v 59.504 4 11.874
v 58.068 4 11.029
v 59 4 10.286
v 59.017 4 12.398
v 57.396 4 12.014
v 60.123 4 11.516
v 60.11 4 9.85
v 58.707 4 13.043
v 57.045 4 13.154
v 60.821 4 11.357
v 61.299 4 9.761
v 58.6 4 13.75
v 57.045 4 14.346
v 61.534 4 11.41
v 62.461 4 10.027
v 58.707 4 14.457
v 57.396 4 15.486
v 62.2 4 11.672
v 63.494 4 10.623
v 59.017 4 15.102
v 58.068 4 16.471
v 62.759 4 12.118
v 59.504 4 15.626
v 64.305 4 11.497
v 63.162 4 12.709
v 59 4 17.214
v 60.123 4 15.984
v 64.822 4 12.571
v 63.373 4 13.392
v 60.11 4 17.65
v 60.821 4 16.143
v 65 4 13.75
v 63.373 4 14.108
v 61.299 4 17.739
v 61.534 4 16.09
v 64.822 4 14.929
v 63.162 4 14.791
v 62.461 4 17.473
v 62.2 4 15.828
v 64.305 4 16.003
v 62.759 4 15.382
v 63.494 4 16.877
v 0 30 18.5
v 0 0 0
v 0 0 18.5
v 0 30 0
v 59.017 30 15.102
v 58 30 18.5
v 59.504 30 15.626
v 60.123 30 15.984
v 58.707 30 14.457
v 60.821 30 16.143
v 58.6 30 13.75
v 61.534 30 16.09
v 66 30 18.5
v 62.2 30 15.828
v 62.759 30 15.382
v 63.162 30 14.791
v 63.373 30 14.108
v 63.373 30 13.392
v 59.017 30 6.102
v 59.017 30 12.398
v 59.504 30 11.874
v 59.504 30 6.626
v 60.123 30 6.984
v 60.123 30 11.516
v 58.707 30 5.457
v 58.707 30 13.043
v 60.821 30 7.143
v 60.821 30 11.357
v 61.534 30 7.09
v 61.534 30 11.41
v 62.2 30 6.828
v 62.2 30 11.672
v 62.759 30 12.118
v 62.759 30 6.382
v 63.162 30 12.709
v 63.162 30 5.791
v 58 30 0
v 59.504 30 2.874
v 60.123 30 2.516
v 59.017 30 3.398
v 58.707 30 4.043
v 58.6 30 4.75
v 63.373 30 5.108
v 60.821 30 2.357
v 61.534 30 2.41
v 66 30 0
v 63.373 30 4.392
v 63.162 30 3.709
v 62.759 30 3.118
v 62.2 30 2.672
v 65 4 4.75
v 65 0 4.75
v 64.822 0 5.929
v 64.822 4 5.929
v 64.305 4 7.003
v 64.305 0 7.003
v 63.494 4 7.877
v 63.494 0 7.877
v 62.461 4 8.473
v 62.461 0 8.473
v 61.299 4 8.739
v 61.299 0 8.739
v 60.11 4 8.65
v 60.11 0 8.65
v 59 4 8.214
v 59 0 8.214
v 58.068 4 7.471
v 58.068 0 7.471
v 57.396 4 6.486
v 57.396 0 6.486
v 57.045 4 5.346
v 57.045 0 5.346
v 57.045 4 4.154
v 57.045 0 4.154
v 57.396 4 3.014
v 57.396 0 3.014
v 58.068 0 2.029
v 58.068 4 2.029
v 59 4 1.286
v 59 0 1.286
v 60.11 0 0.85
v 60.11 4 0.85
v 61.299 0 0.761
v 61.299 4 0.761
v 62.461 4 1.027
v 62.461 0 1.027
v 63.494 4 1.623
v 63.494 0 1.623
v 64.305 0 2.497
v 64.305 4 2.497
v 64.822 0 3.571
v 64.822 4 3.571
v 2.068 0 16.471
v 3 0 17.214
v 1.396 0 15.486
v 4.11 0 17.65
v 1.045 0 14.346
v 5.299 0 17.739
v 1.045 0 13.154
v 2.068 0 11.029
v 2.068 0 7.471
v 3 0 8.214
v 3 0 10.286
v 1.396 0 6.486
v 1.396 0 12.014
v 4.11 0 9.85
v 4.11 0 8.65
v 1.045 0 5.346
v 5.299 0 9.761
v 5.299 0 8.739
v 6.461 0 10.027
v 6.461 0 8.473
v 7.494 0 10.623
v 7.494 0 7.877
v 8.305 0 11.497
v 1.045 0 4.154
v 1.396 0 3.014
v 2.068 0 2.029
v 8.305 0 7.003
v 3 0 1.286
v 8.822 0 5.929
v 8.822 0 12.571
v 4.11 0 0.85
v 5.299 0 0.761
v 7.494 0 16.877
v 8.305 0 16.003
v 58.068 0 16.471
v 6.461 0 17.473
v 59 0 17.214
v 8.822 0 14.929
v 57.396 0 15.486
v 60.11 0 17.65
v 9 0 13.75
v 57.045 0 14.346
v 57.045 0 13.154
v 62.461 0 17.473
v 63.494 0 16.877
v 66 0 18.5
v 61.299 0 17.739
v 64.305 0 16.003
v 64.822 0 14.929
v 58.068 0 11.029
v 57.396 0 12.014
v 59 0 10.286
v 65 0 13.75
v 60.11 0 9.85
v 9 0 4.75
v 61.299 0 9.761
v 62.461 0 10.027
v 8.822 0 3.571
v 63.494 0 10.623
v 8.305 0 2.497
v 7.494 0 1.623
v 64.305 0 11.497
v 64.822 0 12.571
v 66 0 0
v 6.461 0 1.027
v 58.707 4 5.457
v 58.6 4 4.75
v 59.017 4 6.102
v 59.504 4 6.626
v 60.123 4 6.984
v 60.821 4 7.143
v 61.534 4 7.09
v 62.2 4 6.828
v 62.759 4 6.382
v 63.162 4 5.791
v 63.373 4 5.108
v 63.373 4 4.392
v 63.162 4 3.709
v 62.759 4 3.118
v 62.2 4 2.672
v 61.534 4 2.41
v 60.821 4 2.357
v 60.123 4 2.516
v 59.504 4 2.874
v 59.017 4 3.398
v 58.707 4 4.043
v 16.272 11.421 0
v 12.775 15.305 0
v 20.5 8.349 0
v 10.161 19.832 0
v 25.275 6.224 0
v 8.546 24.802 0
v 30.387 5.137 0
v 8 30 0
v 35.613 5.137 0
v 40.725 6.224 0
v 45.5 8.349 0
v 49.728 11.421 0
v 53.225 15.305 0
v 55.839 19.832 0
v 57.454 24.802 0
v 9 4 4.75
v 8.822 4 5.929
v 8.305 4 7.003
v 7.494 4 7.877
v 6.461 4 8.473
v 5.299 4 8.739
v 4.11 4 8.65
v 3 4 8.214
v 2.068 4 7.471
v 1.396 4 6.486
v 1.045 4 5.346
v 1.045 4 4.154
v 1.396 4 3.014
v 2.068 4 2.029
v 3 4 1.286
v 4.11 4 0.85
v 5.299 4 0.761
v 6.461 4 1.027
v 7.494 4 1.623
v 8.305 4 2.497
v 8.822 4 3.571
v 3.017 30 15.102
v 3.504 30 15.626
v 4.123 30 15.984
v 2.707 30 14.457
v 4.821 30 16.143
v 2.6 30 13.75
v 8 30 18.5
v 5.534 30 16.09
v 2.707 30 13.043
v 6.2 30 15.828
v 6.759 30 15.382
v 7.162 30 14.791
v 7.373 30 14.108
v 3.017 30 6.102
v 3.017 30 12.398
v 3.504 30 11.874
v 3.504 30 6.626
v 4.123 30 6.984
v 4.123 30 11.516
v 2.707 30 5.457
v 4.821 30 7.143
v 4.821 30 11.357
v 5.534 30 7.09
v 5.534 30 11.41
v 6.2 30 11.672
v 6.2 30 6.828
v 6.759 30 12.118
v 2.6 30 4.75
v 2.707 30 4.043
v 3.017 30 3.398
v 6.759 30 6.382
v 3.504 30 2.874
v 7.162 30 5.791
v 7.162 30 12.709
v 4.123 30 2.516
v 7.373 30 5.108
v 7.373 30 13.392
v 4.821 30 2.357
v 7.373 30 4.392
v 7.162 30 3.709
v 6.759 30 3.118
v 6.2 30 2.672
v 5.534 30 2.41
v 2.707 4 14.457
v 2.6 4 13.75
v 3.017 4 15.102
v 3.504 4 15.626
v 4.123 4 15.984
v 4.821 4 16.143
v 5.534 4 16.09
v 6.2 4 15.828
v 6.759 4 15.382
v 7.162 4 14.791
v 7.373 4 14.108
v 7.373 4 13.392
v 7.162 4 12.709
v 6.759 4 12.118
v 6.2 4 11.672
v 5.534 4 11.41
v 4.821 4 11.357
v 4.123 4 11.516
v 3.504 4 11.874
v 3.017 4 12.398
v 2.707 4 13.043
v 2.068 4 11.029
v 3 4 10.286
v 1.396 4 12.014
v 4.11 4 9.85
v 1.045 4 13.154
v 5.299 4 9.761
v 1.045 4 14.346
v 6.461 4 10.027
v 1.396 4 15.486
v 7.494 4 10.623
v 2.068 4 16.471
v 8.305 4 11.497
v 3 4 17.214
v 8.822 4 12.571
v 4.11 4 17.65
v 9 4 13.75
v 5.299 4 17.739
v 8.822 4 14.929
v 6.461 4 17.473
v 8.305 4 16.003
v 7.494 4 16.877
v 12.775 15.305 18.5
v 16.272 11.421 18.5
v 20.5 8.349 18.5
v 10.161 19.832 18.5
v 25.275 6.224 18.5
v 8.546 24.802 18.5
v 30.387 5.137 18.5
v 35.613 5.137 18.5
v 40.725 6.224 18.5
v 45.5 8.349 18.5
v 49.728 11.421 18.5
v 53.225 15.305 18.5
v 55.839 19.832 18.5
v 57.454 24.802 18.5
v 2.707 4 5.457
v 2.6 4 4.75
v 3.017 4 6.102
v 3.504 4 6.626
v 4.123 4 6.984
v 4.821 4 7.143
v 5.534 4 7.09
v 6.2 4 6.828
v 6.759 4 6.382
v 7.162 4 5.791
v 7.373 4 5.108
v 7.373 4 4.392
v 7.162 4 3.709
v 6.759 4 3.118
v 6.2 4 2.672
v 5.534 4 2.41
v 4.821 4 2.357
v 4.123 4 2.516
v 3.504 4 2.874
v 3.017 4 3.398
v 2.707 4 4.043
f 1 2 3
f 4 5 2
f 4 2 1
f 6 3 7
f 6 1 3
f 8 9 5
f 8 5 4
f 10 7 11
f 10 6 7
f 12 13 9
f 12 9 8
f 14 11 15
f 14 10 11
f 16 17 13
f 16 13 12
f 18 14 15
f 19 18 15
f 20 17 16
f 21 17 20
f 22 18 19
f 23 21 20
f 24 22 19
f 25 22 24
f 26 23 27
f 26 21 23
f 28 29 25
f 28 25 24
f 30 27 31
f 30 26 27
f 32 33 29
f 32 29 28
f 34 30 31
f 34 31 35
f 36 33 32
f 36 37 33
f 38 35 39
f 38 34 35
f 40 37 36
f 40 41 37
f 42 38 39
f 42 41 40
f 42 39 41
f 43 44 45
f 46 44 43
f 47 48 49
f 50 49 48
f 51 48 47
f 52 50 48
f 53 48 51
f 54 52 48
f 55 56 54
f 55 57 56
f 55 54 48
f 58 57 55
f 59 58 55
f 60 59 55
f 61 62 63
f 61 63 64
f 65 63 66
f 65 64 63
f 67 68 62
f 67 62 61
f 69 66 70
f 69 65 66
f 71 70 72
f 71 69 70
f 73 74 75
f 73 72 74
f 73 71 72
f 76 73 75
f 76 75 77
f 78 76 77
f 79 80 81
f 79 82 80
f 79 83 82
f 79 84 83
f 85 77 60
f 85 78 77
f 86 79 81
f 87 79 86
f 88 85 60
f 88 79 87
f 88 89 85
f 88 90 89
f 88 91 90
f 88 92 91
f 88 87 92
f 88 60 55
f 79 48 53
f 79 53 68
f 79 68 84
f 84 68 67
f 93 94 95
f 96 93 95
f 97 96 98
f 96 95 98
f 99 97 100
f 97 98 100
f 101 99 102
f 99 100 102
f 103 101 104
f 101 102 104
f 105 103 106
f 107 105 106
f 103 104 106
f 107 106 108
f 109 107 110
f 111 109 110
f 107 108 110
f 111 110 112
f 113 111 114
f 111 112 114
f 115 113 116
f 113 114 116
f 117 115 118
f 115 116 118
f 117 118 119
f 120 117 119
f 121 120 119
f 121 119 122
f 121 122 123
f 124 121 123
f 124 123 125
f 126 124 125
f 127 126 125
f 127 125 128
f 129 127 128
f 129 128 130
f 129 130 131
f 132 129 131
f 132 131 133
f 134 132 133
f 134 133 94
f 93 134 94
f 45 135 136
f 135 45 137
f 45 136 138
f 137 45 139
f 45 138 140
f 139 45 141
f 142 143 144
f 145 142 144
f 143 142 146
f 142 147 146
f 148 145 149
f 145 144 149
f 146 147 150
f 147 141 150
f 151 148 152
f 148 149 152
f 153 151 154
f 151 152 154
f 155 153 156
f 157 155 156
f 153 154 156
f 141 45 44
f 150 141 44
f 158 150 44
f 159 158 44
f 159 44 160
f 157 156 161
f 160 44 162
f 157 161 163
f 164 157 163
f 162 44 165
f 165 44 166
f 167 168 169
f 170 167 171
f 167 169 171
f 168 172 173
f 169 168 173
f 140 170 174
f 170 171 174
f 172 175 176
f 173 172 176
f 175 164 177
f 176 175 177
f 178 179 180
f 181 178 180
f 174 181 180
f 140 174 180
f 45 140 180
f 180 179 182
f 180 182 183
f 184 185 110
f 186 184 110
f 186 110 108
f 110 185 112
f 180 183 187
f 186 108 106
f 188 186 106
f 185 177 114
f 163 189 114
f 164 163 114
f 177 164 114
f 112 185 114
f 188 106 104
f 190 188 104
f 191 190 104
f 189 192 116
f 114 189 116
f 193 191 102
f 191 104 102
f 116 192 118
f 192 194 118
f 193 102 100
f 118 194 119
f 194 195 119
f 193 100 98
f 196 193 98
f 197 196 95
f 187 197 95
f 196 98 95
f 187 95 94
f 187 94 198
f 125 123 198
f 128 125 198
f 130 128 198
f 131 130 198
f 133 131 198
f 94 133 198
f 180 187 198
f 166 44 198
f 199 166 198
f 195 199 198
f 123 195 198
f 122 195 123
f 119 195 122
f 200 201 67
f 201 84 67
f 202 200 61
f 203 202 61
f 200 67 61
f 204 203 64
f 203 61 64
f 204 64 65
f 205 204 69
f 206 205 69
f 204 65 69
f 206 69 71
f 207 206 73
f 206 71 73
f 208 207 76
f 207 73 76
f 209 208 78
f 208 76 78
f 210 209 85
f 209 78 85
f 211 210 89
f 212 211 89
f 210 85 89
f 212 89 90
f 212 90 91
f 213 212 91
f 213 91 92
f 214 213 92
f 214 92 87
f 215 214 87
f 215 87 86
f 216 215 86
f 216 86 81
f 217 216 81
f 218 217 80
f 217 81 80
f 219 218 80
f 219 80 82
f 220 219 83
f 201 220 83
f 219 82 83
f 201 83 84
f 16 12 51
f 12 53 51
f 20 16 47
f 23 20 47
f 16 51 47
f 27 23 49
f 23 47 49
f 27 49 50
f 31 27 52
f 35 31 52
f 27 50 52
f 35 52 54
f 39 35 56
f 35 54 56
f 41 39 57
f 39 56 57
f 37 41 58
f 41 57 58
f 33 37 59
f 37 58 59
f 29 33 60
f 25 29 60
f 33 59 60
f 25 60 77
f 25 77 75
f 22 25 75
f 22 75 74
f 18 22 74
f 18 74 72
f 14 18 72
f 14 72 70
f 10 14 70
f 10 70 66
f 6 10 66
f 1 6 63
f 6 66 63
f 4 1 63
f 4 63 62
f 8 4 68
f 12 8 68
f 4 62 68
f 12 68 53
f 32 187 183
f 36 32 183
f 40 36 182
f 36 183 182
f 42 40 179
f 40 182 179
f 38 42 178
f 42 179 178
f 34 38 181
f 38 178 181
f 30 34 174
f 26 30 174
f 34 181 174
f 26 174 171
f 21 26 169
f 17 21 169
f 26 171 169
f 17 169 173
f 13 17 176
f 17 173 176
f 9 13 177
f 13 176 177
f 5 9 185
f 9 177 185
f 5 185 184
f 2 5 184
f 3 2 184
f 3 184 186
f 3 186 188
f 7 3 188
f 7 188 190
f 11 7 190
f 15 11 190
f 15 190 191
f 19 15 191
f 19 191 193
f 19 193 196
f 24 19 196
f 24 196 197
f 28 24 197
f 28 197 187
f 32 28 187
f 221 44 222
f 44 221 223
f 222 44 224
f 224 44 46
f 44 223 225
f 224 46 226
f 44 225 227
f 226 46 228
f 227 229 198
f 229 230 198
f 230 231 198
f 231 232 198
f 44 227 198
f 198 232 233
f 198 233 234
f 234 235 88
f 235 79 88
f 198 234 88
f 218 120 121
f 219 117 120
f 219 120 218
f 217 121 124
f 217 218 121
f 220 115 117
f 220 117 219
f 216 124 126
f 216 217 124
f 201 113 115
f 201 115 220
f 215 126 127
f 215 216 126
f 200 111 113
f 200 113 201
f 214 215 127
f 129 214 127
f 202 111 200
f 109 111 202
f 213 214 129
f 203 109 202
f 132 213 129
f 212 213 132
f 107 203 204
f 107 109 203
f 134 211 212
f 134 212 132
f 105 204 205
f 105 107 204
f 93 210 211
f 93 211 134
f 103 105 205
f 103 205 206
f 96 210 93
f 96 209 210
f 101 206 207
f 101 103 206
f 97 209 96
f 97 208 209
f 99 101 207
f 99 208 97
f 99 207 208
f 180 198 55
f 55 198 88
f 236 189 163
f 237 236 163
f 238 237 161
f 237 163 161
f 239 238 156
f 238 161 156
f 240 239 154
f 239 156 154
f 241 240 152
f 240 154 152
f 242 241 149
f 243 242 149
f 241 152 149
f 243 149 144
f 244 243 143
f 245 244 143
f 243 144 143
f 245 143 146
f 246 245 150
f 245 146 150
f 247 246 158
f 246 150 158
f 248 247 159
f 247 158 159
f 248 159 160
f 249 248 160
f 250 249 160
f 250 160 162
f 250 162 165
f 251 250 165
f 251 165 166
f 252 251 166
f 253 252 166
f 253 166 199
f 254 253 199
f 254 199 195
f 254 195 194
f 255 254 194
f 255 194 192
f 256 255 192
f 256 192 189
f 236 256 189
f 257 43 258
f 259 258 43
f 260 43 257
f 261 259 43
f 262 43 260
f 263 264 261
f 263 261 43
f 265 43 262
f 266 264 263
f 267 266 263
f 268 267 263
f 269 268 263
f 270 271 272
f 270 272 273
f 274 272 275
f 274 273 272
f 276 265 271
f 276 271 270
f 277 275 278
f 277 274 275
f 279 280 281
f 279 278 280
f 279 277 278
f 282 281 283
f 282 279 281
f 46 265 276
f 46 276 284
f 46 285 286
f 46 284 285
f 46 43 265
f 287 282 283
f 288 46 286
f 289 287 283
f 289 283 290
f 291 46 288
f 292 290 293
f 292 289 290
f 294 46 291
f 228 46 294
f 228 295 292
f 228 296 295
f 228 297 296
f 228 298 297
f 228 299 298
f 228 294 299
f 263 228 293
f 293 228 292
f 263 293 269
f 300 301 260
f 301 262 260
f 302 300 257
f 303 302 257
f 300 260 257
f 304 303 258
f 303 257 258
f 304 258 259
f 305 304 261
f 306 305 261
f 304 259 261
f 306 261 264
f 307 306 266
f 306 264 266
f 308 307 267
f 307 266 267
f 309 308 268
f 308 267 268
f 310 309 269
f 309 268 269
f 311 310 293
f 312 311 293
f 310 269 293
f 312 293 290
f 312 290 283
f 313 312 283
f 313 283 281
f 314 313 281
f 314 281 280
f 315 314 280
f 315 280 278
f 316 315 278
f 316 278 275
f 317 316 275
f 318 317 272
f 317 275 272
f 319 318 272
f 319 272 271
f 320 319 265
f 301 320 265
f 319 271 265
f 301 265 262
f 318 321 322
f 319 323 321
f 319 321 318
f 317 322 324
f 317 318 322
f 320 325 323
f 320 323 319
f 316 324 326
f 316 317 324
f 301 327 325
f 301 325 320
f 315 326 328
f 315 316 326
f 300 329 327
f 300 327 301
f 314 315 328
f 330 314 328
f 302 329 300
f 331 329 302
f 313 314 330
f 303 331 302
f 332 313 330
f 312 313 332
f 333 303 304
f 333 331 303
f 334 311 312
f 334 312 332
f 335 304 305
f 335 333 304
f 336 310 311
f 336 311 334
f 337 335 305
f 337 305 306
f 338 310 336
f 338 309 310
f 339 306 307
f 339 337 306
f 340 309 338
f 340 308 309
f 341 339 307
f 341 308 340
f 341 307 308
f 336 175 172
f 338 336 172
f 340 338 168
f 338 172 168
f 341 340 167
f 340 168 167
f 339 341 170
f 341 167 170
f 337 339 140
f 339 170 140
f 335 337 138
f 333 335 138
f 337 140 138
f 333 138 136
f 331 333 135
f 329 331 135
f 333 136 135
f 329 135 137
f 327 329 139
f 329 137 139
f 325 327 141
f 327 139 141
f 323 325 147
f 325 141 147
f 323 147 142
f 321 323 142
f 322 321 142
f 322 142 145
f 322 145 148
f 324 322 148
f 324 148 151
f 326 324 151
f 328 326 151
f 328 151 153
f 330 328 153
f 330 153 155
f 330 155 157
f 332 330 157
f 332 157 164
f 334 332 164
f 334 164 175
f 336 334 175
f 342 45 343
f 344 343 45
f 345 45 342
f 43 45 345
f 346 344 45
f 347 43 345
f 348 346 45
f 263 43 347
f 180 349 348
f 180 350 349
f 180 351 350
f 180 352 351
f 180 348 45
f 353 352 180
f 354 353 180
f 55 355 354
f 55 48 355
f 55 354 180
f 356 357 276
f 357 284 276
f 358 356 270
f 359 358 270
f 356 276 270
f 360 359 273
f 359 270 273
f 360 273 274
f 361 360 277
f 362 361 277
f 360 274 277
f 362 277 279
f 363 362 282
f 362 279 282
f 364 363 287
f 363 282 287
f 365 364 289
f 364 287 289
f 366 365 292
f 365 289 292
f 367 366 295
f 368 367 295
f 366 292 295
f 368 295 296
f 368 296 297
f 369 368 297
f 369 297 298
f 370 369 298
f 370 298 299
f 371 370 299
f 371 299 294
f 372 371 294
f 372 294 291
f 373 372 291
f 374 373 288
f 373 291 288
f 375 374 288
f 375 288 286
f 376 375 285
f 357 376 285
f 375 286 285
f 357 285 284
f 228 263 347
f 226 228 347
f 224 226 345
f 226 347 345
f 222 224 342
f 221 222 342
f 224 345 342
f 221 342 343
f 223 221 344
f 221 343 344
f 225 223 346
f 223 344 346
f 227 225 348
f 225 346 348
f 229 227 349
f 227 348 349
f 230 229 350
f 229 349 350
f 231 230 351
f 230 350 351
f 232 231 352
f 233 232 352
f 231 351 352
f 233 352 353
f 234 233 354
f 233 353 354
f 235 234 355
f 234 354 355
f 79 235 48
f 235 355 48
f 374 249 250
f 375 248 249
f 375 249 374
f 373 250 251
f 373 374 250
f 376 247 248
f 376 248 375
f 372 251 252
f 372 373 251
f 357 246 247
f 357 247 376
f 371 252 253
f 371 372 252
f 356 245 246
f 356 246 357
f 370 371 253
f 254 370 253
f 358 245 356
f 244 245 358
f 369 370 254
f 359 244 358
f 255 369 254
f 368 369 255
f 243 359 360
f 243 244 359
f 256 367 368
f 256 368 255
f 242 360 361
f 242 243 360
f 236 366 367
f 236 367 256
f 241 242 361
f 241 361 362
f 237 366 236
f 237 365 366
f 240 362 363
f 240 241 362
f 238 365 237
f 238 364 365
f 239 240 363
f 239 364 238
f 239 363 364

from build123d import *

# Parameters (mm, degrees)
SKETCH_1_W                   = 66
SKETCH_1_H                   = 30
EXTRUDE_1_DEPTH              = 18.5
SKETCH_2_R                   = 25
CUT_EXTRUDE_1_DEPTH          = 75.821454143
HOLE_WIZARD_M4_1_D           = 4.8
HOLE_WIZARD_M4_1_CBORE_D     = 8
HOLE_WIZARD_M4_1_CBORE_DEPTH = 4


with BuildPart() as part:
    # 草图1 → 凸台-拉伸1 (new body)
    with BuildSketch(Plane.XY):
        with Locations((33, 15)):
            Rectangle(SKETCH_1_W, SKETCH_1_H)
    extrude(amount=EXTRUDE_1_DEPTH)

    # 草图2 → 切除-拉伸1 (cut, through all)
    with BuildSketch(Plane.XY.offset(18.5)):
        with Locations((33, 30)):
            Circle(SKETCH_2_R)
    extrude(amount=-CUT_EXTRUDE_1_DEPTH, mode=Mode.SUBTRACT)

    # M4 六角凹头螺钉的柱形沉头孔1 (through all)
    with Locations(Plane.XZ):
        with Locations((5, 13.75), (5, 4.75), (61, 13.75), (61, 4.75)):
            CounterBoreHole(HOLE_WIZARD_M4_1_D / 2, HOLE_WIZARD_M4_1_CBORE_D / 2, HOLE_WIZARD_M4_1_CBORE_DEPTH)


solid = part.part
